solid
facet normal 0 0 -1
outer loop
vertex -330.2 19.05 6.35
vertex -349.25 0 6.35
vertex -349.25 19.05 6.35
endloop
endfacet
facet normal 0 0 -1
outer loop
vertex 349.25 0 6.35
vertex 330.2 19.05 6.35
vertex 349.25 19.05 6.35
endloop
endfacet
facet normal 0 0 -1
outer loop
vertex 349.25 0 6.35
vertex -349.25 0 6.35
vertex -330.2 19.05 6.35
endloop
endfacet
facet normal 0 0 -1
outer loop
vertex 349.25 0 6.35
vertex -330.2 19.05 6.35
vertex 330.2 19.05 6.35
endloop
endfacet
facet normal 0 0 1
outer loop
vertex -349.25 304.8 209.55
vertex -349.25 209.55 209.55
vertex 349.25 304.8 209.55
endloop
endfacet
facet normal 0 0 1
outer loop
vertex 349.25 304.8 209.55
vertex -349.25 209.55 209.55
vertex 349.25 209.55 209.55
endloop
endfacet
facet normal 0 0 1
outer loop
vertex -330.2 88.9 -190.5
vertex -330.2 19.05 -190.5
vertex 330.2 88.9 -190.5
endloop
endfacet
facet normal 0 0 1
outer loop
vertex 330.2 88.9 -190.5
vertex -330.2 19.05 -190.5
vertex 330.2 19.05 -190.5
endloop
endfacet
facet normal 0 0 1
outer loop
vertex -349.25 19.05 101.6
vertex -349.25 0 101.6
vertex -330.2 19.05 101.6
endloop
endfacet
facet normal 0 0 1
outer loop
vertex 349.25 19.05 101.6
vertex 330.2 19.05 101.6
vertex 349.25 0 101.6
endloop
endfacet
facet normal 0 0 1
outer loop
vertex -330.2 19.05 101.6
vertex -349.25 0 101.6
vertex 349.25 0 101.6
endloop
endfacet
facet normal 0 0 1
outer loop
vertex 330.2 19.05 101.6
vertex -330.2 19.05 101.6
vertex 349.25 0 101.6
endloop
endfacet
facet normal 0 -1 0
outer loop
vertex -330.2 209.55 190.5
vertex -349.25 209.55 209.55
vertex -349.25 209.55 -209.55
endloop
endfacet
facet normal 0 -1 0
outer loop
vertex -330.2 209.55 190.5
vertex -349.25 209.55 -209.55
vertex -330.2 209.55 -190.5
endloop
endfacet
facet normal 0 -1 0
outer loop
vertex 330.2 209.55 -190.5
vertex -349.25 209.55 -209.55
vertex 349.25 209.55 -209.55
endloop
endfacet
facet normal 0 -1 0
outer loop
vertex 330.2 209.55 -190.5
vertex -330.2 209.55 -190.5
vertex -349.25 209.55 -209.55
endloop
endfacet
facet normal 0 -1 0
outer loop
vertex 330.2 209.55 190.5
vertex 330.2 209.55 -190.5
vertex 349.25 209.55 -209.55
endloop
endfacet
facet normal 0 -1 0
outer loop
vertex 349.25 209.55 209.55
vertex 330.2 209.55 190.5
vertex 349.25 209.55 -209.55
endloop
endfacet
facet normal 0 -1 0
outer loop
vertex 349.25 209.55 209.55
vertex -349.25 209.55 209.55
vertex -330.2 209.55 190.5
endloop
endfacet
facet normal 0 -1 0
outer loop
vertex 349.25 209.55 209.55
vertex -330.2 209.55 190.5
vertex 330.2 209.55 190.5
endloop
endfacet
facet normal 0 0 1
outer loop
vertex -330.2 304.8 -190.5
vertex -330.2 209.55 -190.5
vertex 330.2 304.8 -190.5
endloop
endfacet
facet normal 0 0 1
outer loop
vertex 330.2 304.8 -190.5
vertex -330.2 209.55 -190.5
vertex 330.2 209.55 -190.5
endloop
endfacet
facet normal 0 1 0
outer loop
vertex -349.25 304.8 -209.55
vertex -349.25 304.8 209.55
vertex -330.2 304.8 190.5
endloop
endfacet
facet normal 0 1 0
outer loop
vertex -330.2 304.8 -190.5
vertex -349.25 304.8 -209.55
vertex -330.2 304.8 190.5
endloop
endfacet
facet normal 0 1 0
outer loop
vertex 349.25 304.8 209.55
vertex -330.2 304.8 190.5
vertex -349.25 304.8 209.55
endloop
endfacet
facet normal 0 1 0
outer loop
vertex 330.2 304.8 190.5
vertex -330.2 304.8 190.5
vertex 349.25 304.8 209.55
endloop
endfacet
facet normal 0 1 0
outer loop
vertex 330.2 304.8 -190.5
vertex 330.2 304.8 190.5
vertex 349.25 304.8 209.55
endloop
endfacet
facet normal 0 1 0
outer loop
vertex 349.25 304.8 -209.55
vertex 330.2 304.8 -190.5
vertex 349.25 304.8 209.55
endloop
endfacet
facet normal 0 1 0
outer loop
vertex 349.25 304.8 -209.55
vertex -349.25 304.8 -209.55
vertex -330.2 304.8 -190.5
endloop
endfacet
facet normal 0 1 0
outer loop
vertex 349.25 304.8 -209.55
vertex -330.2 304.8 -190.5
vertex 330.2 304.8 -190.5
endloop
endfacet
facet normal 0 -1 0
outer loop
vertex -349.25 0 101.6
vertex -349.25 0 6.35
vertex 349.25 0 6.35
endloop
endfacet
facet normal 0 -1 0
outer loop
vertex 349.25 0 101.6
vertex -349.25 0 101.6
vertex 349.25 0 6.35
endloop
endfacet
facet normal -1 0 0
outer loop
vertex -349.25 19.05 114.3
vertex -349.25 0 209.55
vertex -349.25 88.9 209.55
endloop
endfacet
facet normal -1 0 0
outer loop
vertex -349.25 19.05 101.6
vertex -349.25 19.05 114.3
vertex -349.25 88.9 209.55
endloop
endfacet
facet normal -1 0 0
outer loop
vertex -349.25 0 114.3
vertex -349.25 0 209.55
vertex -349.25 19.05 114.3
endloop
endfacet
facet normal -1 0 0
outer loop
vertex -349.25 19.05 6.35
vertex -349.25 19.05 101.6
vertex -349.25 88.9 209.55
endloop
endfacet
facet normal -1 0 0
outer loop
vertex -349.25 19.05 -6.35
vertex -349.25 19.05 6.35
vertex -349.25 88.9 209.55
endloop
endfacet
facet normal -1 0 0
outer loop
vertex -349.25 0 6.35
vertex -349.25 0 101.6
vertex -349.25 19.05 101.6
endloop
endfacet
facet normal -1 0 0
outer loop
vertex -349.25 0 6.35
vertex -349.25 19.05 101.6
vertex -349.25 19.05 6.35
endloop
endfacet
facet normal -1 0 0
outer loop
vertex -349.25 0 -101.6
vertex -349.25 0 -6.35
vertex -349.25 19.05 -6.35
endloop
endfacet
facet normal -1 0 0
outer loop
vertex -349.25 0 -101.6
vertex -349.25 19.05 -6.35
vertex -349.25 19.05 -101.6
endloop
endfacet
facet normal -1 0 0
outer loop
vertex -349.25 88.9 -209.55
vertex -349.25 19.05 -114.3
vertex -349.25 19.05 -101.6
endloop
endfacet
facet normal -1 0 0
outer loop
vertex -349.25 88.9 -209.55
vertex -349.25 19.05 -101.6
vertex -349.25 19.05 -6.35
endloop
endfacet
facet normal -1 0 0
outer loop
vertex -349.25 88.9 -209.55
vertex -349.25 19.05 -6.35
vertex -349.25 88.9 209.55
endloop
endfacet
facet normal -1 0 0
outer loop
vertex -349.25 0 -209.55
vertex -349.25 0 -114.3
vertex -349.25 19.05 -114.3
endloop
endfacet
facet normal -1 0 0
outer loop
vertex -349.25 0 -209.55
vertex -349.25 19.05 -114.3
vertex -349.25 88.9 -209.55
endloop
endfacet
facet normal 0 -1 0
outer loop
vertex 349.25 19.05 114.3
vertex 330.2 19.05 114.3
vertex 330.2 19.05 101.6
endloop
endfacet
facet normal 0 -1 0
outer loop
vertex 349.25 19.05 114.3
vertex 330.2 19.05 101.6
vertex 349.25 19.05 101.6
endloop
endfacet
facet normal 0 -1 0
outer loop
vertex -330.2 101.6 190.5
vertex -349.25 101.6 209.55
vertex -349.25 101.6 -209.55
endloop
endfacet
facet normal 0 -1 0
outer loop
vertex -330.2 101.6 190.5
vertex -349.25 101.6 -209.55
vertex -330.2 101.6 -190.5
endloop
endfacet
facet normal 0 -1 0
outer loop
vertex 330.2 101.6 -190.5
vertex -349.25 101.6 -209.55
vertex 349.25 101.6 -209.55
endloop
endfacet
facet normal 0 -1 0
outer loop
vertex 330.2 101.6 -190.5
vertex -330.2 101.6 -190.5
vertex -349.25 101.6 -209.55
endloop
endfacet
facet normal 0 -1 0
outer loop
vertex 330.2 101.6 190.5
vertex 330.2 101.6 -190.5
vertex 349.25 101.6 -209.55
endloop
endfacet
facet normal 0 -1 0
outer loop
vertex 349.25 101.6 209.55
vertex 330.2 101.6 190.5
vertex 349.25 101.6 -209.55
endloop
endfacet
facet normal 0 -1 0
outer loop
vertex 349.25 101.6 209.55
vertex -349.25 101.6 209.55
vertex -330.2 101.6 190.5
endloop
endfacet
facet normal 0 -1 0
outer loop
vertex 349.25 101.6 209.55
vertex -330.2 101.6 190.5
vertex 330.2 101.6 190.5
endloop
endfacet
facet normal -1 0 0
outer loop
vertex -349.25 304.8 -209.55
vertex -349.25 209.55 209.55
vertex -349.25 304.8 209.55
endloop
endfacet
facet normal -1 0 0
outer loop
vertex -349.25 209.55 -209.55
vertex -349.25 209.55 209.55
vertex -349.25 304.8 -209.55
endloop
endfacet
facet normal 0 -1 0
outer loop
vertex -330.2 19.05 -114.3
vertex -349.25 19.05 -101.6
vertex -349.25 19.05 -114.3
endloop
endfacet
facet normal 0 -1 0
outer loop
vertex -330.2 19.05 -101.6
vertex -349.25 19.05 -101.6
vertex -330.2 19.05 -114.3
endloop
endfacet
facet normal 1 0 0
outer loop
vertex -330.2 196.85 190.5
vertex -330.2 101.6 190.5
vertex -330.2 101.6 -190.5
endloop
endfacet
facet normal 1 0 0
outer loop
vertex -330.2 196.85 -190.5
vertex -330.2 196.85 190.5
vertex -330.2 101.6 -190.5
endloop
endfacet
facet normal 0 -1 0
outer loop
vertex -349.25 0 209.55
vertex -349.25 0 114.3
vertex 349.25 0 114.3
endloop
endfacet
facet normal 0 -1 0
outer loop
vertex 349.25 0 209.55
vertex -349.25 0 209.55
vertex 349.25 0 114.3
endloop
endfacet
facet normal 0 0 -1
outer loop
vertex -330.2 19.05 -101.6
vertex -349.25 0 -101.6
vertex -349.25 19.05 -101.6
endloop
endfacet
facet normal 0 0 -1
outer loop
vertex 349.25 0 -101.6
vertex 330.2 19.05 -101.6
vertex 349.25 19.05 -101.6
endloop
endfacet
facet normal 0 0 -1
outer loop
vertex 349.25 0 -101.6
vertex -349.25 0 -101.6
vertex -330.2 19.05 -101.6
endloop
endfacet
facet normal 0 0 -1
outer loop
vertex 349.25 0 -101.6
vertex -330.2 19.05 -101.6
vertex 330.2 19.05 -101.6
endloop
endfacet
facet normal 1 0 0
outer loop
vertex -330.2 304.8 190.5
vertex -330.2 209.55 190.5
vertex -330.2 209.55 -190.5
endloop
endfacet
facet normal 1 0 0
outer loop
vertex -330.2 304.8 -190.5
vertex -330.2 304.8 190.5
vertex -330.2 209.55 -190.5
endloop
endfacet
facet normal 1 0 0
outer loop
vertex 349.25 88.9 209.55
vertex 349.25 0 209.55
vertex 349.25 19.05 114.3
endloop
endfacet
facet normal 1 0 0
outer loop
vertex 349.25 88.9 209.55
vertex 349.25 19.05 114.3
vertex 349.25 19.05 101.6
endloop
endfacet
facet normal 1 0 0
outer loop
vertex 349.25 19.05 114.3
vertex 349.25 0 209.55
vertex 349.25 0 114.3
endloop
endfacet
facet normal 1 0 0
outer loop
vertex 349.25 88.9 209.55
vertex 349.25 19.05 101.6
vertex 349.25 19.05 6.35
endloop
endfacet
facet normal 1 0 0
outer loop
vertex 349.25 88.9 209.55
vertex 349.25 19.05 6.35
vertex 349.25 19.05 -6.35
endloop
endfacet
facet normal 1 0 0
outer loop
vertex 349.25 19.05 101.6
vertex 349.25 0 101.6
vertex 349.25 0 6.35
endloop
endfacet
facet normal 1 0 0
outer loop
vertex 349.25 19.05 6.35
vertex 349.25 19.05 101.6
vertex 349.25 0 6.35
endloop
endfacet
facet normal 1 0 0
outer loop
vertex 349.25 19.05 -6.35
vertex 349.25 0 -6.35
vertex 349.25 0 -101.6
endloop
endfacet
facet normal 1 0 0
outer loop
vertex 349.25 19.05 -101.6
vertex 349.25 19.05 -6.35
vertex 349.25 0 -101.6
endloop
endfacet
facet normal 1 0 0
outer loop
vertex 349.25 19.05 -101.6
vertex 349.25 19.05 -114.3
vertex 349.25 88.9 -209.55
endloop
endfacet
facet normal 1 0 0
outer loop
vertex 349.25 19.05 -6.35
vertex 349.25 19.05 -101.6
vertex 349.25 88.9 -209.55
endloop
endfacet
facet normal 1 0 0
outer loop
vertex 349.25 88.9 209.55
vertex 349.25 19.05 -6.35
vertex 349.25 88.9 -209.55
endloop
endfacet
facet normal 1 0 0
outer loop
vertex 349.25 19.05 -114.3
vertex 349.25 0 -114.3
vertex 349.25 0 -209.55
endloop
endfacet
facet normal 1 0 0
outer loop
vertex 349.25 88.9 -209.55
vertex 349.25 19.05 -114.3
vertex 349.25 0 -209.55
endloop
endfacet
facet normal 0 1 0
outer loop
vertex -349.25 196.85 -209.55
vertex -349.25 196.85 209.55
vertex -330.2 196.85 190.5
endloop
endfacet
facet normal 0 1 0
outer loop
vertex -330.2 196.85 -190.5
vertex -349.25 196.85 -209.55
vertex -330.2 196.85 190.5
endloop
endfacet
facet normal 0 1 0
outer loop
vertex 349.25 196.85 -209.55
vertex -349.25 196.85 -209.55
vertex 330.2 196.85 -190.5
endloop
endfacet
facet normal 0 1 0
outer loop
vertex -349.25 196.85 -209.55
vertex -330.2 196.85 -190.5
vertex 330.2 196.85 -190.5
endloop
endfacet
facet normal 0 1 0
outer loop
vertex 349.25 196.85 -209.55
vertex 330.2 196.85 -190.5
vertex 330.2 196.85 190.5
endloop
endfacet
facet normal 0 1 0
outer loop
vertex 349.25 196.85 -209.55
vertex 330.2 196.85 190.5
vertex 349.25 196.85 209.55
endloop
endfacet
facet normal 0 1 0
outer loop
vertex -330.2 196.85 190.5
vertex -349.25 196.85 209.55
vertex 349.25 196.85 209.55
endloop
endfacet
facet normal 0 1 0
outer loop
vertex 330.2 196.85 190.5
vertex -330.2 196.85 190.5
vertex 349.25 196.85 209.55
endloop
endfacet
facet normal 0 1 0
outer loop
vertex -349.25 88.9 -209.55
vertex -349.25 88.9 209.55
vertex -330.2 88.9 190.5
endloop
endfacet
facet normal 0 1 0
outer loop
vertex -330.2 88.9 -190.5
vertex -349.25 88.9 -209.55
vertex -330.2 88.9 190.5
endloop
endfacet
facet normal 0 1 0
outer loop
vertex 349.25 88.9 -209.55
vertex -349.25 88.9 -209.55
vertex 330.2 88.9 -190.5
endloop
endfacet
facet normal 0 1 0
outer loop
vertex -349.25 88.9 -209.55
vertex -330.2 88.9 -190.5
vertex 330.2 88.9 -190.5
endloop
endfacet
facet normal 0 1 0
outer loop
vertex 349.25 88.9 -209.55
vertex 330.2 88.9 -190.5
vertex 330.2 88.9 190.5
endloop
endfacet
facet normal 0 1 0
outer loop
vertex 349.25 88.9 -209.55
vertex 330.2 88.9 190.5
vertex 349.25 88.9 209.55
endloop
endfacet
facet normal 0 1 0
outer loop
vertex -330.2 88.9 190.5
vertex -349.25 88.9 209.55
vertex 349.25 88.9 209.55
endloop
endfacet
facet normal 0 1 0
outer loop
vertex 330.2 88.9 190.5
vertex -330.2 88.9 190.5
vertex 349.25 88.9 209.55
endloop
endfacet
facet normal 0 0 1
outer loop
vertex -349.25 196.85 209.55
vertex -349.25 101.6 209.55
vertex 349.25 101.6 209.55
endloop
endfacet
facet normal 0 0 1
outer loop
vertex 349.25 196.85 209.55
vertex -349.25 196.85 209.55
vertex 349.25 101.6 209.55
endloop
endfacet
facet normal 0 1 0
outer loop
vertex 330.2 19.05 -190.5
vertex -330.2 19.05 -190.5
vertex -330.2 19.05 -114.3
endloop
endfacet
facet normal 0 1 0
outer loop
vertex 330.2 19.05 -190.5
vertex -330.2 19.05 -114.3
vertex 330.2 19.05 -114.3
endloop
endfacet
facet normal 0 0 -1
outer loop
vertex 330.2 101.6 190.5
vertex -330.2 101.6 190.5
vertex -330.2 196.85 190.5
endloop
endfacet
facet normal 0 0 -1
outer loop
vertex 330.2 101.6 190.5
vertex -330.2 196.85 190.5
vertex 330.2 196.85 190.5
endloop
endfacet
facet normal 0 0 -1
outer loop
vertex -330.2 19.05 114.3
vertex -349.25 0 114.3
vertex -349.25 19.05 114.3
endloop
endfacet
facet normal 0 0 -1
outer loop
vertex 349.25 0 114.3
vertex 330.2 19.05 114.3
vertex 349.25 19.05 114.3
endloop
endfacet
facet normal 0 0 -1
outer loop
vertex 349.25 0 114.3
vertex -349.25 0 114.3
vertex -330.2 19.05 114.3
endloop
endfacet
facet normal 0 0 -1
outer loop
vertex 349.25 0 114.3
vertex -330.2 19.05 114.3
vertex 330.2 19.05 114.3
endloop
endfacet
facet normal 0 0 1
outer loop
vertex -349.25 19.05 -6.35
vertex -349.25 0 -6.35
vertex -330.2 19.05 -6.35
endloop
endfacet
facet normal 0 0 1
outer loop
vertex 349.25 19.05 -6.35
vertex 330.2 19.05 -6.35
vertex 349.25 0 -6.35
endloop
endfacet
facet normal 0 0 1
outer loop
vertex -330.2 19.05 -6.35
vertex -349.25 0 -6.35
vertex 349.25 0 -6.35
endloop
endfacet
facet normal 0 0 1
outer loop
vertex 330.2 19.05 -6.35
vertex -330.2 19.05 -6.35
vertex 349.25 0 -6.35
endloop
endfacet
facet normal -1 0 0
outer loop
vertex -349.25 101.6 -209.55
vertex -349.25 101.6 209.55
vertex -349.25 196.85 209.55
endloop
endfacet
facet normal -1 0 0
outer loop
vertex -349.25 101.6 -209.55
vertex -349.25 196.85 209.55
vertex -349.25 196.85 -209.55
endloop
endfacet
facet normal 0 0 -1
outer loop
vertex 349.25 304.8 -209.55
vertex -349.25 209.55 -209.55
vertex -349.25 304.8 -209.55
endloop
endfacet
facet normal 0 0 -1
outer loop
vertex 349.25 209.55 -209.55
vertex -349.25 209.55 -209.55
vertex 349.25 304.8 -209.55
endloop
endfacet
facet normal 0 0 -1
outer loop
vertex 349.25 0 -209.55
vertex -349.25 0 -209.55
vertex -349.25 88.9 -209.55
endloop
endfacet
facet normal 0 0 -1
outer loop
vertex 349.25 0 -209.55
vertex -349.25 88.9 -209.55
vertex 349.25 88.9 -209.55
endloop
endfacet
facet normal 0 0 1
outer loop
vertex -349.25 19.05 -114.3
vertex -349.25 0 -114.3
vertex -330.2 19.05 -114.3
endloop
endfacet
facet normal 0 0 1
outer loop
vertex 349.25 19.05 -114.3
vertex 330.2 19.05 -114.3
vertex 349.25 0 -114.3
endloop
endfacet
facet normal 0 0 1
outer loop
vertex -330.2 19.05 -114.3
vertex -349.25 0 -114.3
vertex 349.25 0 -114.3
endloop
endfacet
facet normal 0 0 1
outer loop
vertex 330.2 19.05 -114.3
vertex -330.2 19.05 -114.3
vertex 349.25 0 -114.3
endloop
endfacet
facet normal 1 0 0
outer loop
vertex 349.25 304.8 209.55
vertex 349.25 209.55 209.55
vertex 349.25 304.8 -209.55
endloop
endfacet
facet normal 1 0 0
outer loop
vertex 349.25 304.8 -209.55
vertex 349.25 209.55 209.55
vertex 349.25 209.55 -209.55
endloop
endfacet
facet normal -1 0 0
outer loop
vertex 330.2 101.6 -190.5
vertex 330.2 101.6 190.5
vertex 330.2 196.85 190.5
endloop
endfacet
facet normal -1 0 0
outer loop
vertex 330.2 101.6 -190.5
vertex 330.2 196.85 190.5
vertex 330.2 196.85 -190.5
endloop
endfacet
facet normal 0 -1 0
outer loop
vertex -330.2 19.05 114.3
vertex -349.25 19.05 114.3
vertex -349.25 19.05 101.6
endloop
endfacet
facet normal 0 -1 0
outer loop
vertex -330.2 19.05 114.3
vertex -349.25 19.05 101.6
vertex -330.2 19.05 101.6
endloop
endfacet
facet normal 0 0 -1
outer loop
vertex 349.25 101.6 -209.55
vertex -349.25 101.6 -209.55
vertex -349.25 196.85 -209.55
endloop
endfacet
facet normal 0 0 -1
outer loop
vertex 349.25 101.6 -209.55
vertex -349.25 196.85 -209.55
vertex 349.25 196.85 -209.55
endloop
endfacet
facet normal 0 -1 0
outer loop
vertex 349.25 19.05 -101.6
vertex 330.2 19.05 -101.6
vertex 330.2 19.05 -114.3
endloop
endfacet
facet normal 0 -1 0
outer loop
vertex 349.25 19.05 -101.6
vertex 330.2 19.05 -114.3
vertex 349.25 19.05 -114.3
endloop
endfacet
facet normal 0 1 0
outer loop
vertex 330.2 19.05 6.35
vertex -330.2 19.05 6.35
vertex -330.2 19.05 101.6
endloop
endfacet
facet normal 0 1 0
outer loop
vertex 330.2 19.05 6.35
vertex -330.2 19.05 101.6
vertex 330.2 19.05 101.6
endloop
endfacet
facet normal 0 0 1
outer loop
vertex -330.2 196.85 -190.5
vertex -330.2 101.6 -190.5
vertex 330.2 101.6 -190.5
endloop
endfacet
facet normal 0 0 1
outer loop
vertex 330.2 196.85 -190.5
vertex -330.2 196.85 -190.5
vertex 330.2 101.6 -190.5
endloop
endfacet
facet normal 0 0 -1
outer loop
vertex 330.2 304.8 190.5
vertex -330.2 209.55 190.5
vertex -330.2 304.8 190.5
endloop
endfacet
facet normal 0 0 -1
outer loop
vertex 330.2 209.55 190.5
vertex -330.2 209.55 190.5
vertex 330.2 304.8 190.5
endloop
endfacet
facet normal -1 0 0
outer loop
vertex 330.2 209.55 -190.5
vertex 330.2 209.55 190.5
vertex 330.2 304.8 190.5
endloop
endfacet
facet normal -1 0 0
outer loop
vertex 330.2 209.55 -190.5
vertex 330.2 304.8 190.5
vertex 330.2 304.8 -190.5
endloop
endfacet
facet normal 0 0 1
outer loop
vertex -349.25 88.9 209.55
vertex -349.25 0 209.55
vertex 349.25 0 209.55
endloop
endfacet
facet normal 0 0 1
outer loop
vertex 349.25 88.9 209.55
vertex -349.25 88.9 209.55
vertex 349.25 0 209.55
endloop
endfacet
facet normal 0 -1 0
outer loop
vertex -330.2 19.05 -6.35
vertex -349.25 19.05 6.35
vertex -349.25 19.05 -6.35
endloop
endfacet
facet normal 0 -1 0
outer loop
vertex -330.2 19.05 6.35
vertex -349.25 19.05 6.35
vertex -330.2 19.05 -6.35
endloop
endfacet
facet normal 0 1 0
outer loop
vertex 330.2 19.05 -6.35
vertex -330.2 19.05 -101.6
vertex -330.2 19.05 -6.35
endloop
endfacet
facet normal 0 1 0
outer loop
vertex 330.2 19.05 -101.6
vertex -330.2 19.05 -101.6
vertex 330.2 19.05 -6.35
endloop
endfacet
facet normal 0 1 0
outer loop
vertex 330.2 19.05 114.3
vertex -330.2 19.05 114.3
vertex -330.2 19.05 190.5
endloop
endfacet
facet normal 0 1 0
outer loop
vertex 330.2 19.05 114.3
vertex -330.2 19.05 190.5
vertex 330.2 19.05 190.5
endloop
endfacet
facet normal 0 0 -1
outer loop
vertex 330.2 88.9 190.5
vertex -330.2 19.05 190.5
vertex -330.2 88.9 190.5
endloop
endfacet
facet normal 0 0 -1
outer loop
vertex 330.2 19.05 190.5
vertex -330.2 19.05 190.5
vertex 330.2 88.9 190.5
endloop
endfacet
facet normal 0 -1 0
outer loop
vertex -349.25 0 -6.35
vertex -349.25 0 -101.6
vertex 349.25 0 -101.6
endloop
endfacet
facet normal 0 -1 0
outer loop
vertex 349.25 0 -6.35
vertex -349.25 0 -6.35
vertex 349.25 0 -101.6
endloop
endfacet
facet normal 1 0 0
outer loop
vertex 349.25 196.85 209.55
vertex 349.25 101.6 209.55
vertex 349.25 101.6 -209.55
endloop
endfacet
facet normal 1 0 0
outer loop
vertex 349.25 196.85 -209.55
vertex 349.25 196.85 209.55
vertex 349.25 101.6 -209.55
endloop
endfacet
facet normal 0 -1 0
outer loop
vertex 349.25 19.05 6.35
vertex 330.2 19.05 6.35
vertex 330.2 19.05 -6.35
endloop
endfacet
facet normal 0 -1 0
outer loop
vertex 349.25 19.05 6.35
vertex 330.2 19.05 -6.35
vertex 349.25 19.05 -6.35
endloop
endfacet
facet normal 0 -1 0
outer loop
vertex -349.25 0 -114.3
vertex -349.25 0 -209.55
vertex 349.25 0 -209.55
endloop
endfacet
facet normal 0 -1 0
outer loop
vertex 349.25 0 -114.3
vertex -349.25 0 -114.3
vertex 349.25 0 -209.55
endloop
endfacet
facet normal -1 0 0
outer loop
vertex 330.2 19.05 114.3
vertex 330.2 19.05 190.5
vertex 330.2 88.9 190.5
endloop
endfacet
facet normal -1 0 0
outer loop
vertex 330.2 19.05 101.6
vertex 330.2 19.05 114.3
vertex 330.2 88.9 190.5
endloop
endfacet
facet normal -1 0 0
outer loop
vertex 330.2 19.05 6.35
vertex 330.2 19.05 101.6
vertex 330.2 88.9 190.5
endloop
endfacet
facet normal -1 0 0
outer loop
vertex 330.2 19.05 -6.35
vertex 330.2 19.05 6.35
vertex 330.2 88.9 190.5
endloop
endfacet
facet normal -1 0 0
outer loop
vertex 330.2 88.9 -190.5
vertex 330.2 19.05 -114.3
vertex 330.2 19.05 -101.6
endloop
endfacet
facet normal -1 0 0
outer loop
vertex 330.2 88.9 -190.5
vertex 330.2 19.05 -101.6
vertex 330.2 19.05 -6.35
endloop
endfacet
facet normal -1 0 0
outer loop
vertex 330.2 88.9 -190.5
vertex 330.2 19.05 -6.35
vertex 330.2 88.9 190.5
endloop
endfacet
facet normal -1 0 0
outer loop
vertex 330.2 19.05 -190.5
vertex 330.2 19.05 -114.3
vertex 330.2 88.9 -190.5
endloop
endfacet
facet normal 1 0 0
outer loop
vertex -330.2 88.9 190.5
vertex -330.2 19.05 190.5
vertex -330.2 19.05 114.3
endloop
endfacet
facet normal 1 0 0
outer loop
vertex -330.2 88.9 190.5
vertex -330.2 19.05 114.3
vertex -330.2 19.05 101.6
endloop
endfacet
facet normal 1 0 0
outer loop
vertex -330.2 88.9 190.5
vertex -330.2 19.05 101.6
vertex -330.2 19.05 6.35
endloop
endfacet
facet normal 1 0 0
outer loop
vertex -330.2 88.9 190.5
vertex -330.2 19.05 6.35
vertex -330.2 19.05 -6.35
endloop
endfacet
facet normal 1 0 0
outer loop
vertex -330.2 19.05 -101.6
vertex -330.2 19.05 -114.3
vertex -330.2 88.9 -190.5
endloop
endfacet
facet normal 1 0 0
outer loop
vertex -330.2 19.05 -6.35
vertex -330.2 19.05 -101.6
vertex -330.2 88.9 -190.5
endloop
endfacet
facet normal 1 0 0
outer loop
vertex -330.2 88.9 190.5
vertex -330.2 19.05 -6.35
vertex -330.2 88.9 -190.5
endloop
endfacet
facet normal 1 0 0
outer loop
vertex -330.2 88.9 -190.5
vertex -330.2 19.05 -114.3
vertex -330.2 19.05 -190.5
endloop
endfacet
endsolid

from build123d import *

# Parameters (mm, degrees)
SKETCH1_W           = 698.5
SKETCH1_H           = 419.1
BOSS_EXTRUDE1_DEPTH = 304.8
SHELL1_T            = -19.05
SKETCH2_W           = 698.5
SKETCH2_H           = 12.7
CUT_EXTRUDE1_DEPTH  = 625.918724715
SKETCH6_W           = 698.5
SKETCH6_H           = 12.7
CUT_EXTRUDE3_DEPTH  = 19.05


with BuildPart() as part:
    # Sketch1 → Boss-Extrude1 (new body)
    with BuildSketch(Plane(origin=(0, 0, 0), x_dir=(1, 0, 0), z_dir=(0, 1, 0))):
        Rectangle(SKETCH1_W, SKETCH1_H)
    extrude(amount=BOSS_EXTRUDE1_DEPTH)

    # Shell1
    shell1_openings = [part.faces().sort_by_distance(p)[0] for p in [
        (0, 304.8, 0),
    ]]
    offset(amount=SHELL1_T, openings=shell1_openings, kind=Kind.INTERSECTION)

    # Sketch2 → Cut-Extrude1 (cut, through all)
    with BuildSketch(Plane.XY.offset(209.55)):
        with Locations((0, 203.2)):
            Rectangle(SKETCH2_W, SKETCH2_H)
        with Locations((0, 95.25)):
            Rectangle(SKETCH2_W, SKETCH2_H)
    extrude(amount=-CUT_EXTRUDE1_DEPTH, mode=Mode.SUBTRACT)


with BuildPart() as cut_extrude1_piece_1:
    # of the separate pieces the step leaves, piece 1, a body of its own (cut_extrude1_pieces)
    add(part.part.solids().sort_by_distance((-349.25, 0, -209.55))[0])

    # Sketch6 → Cut-Extrude3 (cut)
    with BuildSketch(Plane.XZ):
        with Locations((0, 107.95)):
            Rectangle(SKETCH6_W, SKETCH6_H)
        Rectangle(SKETCH6_W, SKETCH6_H)
        with Locations((0, -107.95)):
            Rectangle(SKETCH6_W, SKETCH6_H)
    extrude(amount=-CUT_EXTRUDE3_DEPTH, mode=Mode.SUBTRACT)


with BuildPart() as cut_extrude1_piece_2:
    # of the separate pieces the step leaves, piece 2, a body of its own (cut_extrude1_pieces)
    add(part.part.solids().sort_by_distance((349.25, 209.55, -209.55))[0])


with BuildPart() as cut_extrude1_piece_3:
    # of the separate pieces the step leaves, piece 3, a body of its own (cut_extrude1_pieces)
    add(part.part.solids().sort_by_distance((349.25, 101.6, -209.55))[0])


solid = Compound([cut_extrude1_piece_1.part, cut_extrude1_piece_2.part, cut_extrude1_piece_3.part])
